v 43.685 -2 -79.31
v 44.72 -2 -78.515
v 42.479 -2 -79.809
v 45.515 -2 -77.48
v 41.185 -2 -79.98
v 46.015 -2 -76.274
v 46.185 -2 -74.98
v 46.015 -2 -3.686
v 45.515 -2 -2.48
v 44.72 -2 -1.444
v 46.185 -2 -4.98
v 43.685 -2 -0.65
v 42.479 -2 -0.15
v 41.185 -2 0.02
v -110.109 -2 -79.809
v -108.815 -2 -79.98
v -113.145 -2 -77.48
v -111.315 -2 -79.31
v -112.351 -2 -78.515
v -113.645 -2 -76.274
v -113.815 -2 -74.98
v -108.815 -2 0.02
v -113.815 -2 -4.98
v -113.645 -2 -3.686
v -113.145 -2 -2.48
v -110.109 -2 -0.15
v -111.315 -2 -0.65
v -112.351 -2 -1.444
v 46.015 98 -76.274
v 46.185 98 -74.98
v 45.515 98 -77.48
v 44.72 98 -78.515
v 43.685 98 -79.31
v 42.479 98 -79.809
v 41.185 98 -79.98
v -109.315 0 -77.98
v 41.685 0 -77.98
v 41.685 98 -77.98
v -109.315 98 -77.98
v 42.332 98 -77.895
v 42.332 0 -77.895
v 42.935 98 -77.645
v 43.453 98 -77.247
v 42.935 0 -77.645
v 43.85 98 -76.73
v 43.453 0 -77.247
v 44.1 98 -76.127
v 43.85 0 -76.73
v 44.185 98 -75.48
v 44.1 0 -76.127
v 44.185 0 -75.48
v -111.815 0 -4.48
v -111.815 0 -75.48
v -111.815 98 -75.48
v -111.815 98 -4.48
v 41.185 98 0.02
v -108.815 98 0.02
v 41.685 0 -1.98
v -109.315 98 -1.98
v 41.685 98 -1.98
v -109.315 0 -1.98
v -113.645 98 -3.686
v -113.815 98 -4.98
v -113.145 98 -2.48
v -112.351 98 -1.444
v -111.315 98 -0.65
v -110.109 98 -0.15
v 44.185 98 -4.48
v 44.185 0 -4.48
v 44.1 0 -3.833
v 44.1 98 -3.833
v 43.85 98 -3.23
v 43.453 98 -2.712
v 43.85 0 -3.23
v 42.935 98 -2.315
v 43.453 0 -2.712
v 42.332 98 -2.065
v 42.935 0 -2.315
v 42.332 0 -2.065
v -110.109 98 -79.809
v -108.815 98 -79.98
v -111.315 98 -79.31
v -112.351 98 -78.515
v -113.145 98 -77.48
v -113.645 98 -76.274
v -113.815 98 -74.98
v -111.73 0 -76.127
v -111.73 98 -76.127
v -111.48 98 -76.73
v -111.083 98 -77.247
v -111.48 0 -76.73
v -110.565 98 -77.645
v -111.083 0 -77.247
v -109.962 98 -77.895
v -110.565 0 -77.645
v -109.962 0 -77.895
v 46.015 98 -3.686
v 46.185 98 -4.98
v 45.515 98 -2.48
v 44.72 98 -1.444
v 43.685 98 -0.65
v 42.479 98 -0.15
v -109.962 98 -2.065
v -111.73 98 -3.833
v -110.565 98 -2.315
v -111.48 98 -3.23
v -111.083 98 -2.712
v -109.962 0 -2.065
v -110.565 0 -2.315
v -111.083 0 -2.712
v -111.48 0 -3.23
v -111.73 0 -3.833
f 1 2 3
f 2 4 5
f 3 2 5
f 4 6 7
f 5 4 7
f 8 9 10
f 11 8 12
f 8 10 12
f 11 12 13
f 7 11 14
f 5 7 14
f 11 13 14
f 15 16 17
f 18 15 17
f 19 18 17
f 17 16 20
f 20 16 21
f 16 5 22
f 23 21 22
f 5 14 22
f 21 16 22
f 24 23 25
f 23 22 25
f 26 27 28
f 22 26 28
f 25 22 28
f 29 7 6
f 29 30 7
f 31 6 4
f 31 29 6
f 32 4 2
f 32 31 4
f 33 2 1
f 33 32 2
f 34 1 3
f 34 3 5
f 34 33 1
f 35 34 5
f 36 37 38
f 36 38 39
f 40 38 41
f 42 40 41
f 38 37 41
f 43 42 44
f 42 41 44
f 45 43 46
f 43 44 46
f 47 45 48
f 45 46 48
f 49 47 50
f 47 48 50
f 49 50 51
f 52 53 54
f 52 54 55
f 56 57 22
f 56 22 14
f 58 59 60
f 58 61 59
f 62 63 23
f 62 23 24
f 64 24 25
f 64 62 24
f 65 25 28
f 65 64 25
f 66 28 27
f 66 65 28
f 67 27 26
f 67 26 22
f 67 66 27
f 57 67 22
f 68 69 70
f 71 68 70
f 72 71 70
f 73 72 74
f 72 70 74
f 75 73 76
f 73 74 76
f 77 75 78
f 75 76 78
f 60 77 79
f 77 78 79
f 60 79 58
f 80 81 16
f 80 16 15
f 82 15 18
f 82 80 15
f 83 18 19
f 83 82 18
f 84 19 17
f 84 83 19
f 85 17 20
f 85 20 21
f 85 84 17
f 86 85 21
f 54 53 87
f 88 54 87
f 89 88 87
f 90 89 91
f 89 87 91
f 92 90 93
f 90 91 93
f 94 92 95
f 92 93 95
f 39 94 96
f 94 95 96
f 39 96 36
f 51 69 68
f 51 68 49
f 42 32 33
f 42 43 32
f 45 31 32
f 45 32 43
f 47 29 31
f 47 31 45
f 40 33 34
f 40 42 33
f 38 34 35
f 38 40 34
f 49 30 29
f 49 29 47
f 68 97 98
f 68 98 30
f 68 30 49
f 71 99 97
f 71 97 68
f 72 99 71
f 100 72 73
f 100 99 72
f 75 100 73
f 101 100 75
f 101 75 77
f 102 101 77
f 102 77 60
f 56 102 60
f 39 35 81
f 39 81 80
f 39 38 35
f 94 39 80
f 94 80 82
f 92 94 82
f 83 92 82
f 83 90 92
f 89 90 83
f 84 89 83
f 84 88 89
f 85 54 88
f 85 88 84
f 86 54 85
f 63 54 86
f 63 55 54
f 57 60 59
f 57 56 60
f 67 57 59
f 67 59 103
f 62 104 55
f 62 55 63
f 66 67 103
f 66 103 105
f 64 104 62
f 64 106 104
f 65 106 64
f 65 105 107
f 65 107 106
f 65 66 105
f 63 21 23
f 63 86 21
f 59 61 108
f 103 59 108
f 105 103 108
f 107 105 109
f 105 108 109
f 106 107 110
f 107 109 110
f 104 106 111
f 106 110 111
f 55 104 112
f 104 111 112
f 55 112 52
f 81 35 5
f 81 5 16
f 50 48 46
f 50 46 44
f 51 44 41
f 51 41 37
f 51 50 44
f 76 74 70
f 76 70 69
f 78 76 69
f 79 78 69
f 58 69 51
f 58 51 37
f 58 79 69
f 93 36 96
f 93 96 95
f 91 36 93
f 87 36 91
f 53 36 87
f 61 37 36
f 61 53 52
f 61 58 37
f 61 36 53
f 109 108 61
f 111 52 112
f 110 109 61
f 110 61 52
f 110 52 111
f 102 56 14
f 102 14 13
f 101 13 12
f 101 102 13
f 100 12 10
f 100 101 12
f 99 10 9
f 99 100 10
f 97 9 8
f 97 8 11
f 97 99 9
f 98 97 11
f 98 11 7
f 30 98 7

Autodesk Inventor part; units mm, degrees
ref_plane "YZ Plane" through (0, 0, 0) normal (1, 0, 0) x (0, 1, 0)
ref_plane "XZ Plane" through (0, 0, 0) normal (0, 1, 0) x (-1, 0, 0)
ref_plane "XY Plane" through (0, 0, 0) normal (0, 0, 1) x (1, 0, 0)
sketch "BaseBottom" plane through (0, 0, 0) normal (0, 1, 0) x (-1, 0, 0)
  line L0 (108.8151, 0.0203) -> (-41.1849, 0.0203)
  line L1 (-46.1849, -4.9797) -> (-46.1849, -74.9797)
  line L2 (-41.1849, -79.9797) -> (108.8151, -79.9797)
  line L3 (113.8151, -74.9797) -> (113.8151, -4.9797)
  arc A0 (113.8151, -4.9797) -> (108.8151, 0.0203) centre (108.8151, -4.9797) ccw
  arc A1 (108.8151, -79.9797) -> (113.8151, -74.9797) centre (108.8151, -74.9797) ccw
  arc A2 (-46.1849, -74.9797) -> (-41.1849, -79.9797) centre (-41.1849, -74.9797) ccw
  arc A3 (-41.1849, 0.0203) -> (-46.1849, -4.9797) centre (-41.1849, -4.9797) ccw
  line L4 (109.3151, -1.9797) -> (-41.6849, -1.9797)
  line L5 (-44.1849, -4.4797) -> (-44.1849, -75.4797)
  line L6 (-41.6849, -77.9797) -> (109.3151, -77.9797)
  line L7 (111.8151, -75.4797) -> (111.8151, -4.4797)
  arc A4 (-41.6849, -1.9797) -> (-44.1849, -4.4797) centre (-41.6849, -4.4797) ccw
  arc A5 (-44.1849, -75.4797) -> (-41.6849, -77.9797) centre (-41.6849, -75.4797) ccw
  arc A6 (109.3151, -77.9797) -> (111.8151, -75.4797) centre (109.3151, -75.4797) ccw
  arc A7 (111.8151, -4.4797) -> (109.3151, -1.9797) centre (109.3151, -4.4797) ccw
  line L8 (-46.1849, -29.9797) -> (-44.1849, -29.9797)
  line L9 (-44.1849, -29.9797) -> (-44.1849, -49.9797)
  line L10 (-44.1849, -49.9797) -> (-46.1849, -49.9797)
  line L11 (-46.1849, -49.9797) -> (-46.1849, -29.9797)
  point P0 (-46.1849, -79.9797)
  point P1 (-46.1849, 0.0203)
  point P2 (113.8151, -79.9797)
  point P3 (-44.1849, -77.9797)
  point P4 (-44.1849, -1.9797)
  point P5 (111.8151, -77.9797)
  point P6 (-45.1849, -49.9797)
  dimension "d2" = 160
  dimension "d3" = 80
  dimension "d4" = 5
  dimension "d6" = 156
  dimension "d7" = 76
  dimension "d8" = 2
  dimension "d9" = 2
  dimension "d10" = 2.5
  dimension "d11" = 20
  dimension "d12" = 30
extrude "BaseFloor" add sketch "BaseBottom" against normal blind 2
extrude "BaseFill" add sketch "BaseBottom" along normal blind 98
extrude "BaseHollow" cut sketch "BaseBottom" along normal blind 100 contours L5 A4 L4 A7 L7 A6 L6 A5
properties part number "Base"
